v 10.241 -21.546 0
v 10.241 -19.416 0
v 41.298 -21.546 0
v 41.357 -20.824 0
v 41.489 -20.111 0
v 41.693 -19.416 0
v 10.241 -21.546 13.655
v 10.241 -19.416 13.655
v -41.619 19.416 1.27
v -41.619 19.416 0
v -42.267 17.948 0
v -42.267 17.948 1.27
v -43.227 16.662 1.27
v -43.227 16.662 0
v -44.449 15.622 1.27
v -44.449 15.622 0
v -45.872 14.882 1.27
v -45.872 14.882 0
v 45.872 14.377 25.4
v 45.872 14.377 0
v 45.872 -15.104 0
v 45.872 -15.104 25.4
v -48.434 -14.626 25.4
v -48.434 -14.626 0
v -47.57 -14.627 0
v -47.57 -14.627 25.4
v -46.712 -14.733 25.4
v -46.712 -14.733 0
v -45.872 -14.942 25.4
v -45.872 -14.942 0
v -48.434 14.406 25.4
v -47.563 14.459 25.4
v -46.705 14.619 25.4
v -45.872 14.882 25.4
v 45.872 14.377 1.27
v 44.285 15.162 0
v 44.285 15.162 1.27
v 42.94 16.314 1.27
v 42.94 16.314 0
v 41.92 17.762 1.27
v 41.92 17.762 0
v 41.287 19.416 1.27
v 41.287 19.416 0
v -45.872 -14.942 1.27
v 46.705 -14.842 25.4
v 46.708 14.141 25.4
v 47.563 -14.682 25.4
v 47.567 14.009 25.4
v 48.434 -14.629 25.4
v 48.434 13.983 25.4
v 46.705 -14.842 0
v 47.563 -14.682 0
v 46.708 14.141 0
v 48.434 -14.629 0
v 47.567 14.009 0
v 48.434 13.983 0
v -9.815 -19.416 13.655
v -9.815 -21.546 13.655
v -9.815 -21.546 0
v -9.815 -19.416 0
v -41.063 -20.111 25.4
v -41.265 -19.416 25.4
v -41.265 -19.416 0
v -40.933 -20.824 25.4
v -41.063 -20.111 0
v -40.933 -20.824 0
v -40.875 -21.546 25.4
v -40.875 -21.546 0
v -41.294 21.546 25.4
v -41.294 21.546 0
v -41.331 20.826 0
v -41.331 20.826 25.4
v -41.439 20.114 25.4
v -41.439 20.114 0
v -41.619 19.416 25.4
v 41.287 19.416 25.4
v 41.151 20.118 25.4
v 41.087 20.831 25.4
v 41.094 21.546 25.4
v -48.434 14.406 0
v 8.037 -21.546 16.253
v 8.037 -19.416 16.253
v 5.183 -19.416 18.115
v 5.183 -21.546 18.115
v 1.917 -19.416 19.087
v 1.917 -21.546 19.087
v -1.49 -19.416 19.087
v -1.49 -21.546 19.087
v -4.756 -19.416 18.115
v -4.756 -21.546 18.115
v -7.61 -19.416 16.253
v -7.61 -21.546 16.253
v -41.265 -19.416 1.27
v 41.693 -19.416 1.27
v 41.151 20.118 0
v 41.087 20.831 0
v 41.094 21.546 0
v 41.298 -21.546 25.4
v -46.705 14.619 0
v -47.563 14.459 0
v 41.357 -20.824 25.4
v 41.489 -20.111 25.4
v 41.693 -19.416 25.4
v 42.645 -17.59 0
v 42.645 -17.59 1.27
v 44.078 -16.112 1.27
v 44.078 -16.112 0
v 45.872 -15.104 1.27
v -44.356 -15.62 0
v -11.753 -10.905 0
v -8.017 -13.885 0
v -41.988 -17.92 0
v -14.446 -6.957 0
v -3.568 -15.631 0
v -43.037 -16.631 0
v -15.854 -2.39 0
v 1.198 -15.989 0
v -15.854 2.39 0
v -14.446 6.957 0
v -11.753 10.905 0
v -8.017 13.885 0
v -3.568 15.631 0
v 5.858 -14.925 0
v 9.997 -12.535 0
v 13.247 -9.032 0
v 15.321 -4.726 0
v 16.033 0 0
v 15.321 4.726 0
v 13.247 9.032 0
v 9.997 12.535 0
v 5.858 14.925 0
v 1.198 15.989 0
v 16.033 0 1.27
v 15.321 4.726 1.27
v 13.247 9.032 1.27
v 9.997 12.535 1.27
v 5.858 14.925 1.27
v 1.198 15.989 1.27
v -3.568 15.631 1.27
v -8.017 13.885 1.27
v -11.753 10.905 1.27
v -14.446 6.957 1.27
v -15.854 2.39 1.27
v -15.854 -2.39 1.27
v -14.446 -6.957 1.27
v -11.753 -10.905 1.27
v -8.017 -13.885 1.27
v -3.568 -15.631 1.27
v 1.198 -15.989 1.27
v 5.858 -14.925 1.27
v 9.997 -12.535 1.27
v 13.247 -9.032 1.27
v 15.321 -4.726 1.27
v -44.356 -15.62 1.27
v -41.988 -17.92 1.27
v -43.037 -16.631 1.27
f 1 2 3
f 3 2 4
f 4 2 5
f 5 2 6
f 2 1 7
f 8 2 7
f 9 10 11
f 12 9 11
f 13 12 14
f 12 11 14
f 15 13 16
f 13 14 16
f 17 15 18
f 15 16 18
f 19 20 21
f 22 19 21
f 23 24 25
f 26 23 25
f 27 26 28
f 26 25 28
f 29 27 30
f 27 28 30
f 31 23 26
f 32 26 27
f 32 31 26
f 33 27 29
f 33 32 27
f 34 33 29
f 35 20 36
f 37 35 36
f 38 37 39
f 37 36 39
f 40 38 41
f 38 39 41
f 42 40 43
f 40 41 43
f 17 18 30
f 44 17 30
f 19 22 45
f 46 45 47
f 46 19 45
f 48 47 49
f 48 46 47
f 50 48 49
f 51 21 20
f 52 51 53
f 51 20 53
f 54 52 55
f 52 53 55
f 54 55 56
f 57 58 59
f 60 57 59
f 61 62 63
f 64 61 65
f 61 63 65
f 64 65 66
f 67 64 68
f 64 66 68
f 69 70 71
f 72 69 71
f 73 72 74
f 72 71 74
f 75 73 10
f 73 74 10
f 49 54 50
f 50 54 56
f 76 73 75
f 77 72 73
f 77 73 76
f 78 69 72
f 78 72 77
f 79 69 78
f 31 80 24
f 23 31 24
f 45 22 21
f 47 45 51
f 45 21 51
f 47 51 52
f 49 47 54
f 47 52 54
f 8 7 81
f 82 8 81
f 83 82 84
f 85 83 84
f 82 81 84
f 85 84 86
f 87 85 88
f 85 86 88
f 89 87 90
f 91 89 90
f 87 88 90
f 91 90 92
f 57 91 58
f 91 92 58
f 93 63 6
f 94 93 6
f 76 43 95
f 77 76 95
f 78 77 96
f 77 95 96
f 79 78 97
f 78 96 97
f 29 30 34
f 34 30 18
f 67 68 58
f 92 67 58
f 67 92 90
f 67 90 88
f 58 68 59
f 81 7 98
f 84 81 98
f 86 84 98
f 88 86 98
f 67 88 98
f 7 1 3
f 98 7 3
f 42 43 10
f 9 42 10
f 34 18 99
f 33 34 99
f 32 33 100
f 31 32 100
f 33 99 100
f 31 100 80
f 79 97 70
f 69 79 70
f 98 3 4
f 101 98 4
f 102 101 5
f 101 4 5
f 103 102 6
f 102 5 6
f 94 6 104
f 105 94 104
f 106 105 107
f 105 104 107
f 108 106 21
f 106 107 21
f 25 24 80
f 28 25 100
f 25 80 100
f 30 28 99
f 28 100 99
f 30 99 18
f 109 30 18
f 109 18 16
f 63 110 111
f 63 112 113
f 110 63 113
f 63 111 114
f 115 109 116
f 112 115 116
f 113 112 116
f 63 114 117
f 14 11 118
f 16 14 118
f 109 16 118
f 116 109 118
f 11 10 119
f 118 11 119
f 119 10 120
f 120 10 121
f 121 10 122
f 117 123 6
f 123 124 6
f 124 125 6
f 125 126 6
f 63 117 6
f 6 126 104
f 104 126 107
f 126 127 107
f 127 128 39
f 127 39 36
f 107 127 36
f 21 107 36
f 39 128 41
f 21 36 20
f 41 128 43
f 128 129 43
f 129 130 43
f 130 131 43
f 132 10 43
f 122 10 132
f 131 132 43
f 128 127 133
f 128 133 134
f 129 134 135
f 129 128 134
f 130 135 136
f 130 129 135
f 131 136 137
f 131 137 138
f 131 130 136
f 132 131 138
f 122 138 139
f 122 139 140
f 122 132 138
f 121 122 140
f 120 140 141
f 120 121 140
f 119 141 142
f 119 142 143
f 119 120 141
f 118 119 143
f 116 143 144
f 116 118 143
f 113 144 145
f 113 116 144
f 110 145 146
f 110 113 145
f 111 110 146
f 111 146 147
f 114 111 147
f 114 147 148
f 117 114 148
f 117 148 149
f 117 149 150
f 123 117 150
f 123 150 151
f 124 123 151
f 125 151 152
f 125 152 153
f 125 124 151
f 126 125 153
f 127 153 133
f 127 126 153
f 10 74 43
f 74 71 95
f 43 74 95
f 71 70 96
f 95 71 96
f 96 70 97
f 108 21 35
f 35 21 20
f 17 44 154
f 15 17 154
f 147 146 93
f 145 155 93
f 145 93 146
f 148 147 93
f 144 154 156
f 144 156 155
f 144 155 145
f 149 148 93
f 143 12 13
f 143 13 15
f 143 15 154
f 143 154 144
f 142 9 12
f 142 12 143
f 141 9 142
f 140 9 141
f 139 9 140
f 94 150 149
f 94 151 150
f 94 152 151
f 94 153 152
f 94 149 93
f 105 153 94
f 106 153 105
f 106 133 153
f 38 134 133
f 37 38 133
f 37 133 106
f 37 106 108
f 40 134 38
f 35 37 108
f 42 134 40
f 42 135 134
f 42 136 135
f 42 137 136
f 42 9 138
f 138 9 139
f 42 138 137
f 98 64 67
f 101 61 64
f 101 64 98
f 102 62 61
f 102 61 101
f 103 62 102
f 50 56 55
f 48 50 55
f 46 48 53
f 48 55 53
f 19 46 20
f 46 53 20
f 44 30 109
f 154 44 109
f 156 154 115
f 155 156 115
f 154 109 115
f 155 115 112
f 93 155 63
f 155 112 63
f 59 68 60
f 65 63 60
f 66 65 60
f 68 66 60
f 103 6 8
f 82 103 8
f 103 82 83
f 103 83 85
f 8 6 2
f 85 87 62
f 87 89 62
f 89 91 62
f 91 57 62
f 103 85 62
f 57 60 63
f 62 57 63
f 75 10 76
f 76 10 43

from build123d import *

# Parameters (mm, degrees)
F1_DEPTH = 25.4
F4_DEPTH = 2.286
F0_R     = 16.0333450032
F6_DEPTH = 1.27


# Not quite as in the source:
# - the program builds the solid bodies; features that only make, move or delete a surface that nothing else refers to are left out


with BuildPart() as f1:
    # F0 (on Top) → F1 (new body)
    with BuildSketch(Plane.XY):
        with BuildLine():
            ThreePointArc((41.2870626156, 19.4157604128), (41.1100626555, 20.4737561097), (41.0935558069, 21.5463284403))
            Line((41.0935558069, 21.5463284403), (-41.2941743717, 21.5463284403))
            ThreePointArc((-41.2941743717, 21.5463284403), (-41.3759617074, 20.468700907), (-41.6194500738, 19.4157604128))
            Line((-41.6194500738, 19.4157604128), (41.2870626156, 19.4157604128))
        make_face()
    extrude(amount=F1_DEPTH)


with BuildPart() as f1b:
    # F0 (on Top) → F1, piece 2 (new body)
    with BuildSketch(Plane.XY):
        with BuildLine():
            ThreePointArc((-45.8724014461, 14.8815286098), (-47.1315574375, 14.5259187823), (-48.4344623983, 14.4060404137))
            Line((-48.4344623983, 14.4060404137), (-48.4344623983, -14.6258958917))
            ThreePointArc((-48.4344623983, -14.6258958917), (-47.1390504435, -14.6669589449), (-45.8724014461, -14.9415106237))
            Line((-45.8724014461, -14.9415106237), (-45.8724014461, 14.8815286098))
        make_face()
    extrude(amount=F1_DEPTH)


with BuildPart() as f1c:
    # F0 (on Top) → F1, piece 3 (new body)
    with BuildSketch(Plane.XY):
        with BuildLine():
            ThreePointArc((41.2976550473, -21.5463284403), (41.4141256039, -20.4659523028), (41.6931864989, -19.4157604128))
            Line((41.6931864989, -19.4157604128), (-41.2653559278, -19.4157604128))
            ThreePointArc((-41.2653559278, -19.4157604128), (-40.9888024923, -20.4661473001), (-40.8747712689, -21.5463284403))
            Line((-40.8747712689, -21.5463284403), (41.2976550473, -21.5463284403))
        make_face()
    extrude(amount=F1_DEPTH)

    # F3 (on face) → F4 (cut)
    with BuildSketch(Plane.XZ.offset(21.5463284403)):
        with BuildLine():
            Line((-9.814559482, 13.6550404131), (-9.814559482, 0))
            Line((-9.814559482, 0), (10.2412803099, 0))
            Line((10.2412803099, 0), (10.2412803099, 13.6550404131))
            ThreePointArc((10.2412803099, 13.6550404131), (0.2133604139, 19.2100995282), (-9.814559482, 13.6550404131))
        make_face()
    extrude(amount=-F4_DEPTH, mode=Mode.SUBTRACT)


with BuildPart() as f1d:
    # F0 (on Top) → F1, piece 4 (new body)
    with BuildSketch(Plane.XY):
        with BuildLine():
            Line((48.4344623983, -14.6289617851), (48.4344623983, 13.9825086435))
            ThreePointArc((48.4344623983, 13.9825086435), (47.135395826, 14.0623418721), (45.8724014461, 14.3766546148))
            Line((45.8724014461, 14.3766546148), (45.8724014461, -15.1044499813))
            ThreePointArc((45.8724014461, -15.1044499813), (47.1315574375, -14.7488401538), (48.4344623983, -14.6289617851))
        make_face()
    extrude(amount=F1_DEPTH)


with BuildPart() as f6:
    # F0 (on Top) → F6 (new body)
    with BuildSketch(Plane.XY):
        with BuildLine():
            ThreePointArc((45.8724014461, 14.3766546148), (42.9399574045, 16.31404402), (41.2870626156, 19.4157604128))
            Line((41.2870626156, 19.4157604128), (-41.6194500738, 19.4157604128))
            ThreePointArc((-41.6194500738, 19.4157604128), (-43.2265654792, 16.6615026724), (-45.8724014461, 14.8815286098))
            Line((-45.8724014461, 14.8815286098), (-45.8724014461, -14.9415106237))
            ThreePointArc((-45.8724014461, -14.9415106237), (-43.0374644665, -16.6314489243), (-41.2653559278, -19.4157604128))
            Line((-41.2653559278, -19.4157604128), (41.6931864989, -19.4157604128))
            ThreePointArc((41.6931864989, -19.4157604128), (43.3075853222, -16.7994566018), (45.8724014461, -15.1044499813))
            Line((45.8724014461, -15.1044499813), (45.8724014461, 14.3766546148))
        make_face()
        Circle(F0_R, mode=Mode.SUBTRACT)
    extrude(amount=F6_DEPTH)


solid = Compound([f1.part, f1b.part, f1c.part, f1d.part, f6.part])
